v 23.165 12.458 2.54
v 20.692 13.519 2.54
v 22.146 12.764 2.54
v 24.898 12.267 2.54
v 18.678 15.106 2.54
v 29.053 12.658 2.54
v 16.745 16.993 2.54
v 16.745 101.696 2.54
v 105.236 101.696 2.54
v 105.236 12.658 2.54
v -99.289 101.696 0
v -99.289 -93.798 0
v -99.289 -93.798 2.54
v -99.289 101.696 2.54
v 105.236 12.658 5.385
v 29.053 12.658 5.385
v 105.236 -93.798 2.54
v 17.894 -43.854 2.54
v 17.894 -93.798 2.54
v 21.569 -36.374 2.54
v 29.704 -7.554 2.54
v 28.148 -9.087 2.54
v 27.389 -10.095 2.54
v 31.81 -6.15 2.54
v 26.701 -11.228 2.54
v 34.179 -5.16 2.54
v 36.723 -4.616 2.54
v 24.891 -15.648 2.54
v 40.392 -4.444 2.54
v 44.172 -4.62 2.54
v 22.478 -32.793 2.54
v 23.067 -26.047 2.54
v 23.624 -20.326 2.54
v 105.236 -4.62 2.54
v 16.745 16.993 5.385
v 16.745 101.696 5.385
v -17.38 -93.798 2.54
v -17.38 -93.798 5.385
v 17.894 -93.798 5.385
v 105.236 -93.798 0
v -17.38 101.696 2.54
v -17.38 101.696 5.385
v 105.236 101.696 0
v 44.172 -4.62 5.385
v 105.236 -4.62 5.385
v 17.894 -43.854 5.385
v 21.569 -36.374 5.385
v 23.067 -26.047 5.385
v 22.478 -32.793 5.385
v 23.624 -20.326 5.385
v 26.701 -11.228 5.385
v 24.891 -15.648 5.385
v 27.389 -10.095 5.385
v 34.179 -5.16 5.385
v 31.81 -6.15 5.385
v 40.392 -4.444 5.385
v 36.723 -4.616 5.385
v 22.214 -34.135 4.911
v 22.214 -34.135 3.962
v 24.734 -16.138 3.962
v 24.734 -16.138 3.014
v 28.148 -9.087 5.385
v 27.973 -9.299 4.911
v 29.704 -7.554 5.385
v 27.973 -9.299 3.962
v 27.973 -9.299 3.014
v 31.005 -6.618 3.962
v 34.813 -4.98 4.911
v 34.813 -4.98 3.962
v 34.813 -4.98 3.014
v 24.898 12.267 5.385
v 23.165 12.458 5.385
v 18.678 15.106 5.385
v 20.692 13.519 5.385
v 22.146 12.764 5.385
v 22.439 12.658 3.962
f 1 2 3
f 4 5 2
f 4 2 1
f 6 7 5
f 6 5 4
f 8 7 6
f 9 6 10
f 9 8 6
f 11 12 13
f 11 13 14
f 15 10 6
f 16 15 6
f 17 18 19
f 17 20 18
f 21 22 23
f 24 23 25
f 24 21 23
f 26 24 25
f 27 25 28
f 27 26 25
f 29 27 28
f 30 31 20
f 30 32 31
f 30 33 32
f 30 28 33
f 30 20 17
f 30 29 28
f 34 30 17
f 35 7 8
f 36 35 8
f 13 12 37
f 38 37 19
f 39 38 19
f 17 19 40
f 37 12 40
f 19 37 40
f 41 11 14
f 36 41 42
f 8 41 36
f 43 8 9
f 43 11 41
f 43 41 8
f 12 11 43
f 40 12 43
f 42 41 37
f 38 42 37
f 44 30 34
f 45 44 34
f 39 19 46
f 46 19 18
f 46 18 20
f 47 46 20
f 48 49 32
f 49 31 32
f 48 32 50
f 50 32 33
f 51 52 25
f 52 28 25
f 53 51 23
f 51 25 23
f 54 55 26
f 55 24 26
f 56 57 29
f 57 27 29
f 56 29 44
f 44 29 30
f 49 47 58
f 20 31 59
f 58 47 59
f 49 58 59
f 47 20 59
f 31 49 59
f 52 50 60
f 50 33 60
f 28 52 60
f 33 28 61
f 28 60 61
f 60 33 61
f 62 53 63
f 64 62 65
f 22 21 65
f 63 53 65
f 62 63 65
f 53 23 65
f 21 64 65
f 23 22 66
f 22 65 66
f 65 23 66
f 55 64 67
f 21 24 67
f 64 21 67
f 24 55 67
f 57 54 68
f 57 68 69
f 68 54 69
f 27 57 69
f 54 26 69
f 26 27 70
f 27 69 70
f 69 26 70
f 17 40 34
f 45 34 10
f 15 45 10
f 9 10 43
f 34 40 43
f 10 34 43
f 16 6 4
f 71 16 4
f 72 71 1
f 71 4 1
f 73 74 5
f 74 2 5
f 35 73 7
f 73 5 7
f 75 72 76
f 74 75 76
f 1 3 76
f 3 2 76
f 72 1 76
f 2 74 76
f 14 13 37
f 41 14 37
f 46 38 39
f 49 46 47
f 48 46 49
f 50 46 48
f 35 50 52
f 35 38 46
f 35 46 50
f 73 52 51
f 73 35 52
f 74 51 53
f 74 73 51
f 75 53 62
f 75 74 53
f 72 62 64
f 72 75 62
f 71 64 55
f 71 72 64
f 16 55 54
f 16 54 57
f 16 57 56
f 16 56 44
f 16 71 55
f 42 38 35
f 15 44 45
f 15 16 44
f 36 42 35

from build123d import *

# Parameters (mm, degrees)
F0_W     = 204.5249342918
F0_H     = 195.493966341
F1_DEPTH = 2.54
F3_DEPTH = 2.8448


with BuildPart() as f1:
    # F0 (on Top) → F1 (new body)
    with BuildSketch(Plane.XY):
        with Locations((2.9734447598, 3.9486810565)):
            Rectangle(F0_W, F0_H)
    extrude(amount=F1_DEPTH)

    # F2 (on face) → F3 (join)
    with BuildSketch(Plane.XY.offset(2.54)):
        with BuildLine():
            Line((-17.3801127821, -43.1336462498), (-17.3801127821, -93.798302114))
            Line((-17.3801127821, -93.798302114), (17.8944449872, -93.798302114))
            Line((17.8944449872, -93.798302114), (17.8944449872, -43.8535362482))
            add(Edge.make_bspline(
                [(17.8944449872, -43.8535362482), (19.6377973848, -40.8099152189), (23.1994125002, -34.5918914397), (22.8672950733, -22.568415978), (24.6099326679, -16.2696792332), (27.280489177, -8.681472684), (34.7377245339, -4.0405072298), (40.9514398387, -4.4219057306), (44.1720969975, -4.6195900068)],
                knots=[0, 0, 0, 0, 0.1822465719, 0.3723241188, 0.5162955376, 0.6700276511, 0.828970631, 1, 1, 1, 1], degree=3))
            Line((44.1720969975, -4.6195900068), (105.2359119058, -4.6195900068))
            Line((105.2359119058, -4.6195900068), (105.2359119058, 12.6577429473))
            Line((105.2359119058, 12.6577429473), (36.2526699901, 12.6577429473))
            Line((36.2526699901, 12.6577429473), (29.0531925857, 12.6577429473))
            add(Edge.make_bspline(
                [(29.0531925857, 12.6577429473), (26.7554854749, 12.3173098622), (22.0675905119, 11.6227415521), (18.5421925524, 15.1794504397), (16.7447198182, 16.992887482)],
                knots=[0, 0, 0, 0, 0.4901362187, 1, 1, 1, 1], degree=3))
            Line((16.7447198182, 16.992887482), (16.7447198182, 101.695664227))
            Line((16.7447198182, 101.695664227), (-17.3801127821, 101.695664227))
            Line((-17.3801127821, 101.695664227), (-17.3801127821, -43.1336462498))
        make_face()
    extrude(amount=F3_DEPTH)


solid = f1.part
